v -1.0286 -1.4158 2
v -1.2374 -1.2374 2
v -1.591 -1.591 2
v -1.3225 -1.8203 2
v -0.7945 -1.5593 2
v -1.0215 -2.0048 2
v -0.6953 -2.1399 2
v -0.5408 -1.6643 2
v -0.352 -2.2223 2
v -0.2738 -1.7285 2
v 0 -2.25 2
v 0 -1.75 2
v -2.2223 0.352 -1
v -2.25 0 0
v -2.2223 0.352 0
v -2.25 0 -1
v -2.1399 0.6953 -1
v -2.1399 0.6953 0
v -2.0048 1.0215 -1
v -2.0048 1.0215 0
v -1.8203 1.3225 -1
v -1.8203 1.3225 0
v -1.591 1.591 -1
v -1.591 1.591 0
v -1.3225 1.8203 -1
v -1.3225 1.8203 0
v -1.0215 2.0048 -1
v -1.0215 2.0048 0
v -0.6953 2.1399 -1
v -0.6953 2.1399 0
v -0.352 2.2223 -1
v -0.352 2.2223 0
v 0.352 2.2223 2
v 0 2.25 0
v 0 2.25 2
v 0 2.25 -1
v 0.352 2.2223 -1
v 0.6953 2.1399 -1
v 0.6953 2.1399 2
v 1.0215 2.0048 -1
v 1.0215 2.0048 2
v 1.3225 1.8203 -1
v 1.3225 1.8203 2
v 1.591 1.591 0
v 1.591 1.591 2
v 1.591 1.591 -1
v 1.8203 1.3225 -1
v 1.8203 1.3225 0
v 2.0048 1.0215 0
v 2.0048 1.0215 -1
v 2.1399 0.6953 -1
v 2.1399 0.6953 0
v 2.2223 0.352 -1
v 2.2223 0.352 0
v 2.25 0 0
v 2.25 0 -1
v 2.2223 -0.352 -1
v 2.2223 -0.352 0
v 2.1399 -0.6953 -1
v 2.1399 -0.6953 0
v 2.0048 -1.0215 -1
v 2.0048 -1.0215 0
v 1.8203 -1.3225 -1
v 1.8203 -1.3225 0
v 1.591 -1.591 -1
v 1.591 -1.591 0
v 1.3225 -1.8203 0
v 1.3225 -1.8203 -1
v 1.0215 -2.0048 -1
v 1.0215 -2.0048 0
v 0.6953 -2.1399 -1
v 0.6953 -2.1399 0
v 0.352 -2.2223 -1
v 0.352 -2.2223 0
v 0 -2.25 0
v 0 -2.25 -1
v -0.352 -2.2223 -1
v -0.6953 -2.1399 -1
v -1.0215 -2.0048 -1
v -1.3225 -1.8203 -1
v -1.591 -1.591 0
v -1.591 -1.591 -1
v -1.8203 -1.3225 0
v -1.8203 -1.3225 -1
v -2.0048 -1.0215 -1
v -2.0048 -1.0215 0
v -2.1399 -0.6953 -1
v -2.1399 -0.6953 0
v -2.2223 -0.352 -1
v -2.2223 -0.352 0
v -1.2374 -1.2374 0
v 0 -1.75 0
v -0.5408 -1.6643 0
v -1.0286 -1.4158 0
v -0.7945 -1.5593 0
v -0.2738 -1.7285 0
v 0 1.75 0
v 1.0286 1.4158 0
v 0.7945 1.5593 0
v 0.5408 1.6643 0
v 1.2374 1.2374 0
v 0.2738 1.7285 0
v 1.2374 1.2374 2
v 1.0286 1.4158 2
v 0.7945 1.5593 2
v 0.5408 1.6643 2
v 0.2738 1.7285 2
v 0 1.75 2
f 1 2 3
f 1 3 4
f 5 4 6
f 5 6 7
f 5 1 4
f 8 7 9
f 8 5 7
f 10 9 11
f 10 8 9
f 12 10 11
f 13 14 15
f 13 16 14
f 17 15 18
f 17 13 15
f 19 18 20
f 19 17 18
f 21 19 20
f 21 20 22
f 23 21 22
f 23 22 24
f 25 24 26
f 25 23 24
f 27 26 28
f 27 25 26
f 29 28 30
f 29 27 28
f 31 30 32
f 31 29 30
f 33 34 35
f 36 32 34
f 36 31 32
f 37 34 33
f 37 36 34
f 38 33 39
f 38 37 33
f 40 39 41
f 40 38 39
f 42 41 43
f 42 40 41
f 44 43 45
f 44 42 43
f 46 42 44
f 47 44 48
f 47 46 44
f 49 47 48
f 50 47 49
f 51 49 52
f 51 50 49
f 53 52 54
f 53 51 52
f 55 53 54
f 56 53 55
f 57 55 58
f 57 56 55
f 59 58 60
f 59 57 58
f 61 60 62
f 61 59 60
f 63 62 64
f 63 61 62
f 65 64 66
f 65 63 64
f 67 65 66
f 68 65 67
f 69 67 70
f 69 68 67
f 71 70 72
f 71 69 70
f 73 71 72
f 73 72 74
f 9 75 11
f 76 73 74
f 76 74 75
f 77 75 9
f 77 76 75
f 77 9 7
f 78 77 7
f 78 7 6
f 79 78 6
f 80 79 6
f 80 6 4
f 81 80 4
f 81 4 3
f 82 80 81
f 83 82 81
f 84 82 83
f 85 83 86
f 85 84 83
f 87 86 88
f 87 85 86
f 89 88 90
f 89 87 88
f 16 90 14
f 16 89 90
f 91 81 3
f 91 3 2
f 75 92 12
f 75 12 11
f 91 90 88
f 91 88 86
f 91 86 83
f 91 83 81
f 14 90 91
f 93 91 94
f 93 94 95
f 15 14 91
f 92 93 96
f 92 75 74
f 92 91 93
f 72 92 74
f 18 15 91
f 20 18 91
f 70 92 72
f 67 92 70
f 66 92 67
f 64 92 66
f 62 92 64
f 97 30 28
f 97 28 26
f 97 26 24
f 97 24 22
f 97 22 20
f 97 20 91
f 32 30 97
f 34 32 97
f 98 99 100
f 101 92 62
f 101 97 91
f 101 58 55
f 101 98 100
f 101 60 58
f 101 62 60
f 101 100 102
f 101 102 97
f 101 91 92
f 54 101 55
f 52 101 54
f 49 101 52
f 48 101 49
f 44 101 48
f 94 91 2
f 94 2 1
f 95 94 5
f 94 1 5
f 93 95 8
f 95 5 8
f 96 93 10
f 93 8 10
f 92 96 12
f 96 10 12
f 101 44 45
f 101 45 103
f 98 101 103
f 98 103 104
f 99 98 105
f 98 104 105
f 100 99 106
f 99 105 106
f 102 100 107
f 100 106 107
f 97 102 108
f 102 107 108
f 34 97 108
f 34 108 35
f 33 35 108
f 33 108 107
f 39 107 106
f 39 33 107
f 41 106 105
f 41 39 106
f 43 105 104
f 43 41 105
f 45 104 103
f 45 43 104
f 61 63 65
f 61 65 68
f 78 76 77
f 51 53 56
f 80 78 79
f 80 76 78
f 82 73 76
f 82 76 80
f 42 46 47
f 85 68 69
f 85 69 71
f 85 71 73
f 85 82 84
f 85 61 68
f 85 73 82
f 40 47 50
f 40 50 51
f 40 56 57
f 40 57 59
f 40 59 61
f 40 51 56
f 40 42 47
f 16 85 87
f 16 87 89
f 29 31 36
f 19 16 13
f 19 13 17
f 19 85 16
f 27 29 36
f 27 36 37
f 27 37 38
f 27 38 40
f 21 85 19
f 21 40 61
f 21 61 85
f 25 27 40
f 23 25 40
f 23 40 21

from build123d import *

# Parameters (mm, degrees)
SKETCH9_R           = 2.25
BOSS_EXTRUDE1_DEPTH = 2
SHELL1_T            = -1
CUT_EXTRUDE4_START  = -1
CUT_EXTRUDE4_DEPTH  = 1
BOSS_EXTRUDE2_START = 1
SKETCH11_R          = 2.25
BOSS_EXTRUDE2_DEPTH = 1
CUT_EXTRUDE5_START  = -2
CUT_EXTRUDE5_DEPTH  = 2
SKETCH13_R          = 1.75
CUT_EXTRUDE6_DEPTH  = 2


with BuildPart() as part:
    # Sketch9 → Boss-Extrude1 (new body)
    with BuildSketch(Plane.XY):
        Circle(SKETCH9_R)
    extrude(amount=BOSS_EXTRUDE1_DEPTH)

    # Shell1
    shell1_openings = [part.faces().sort_by_distance(p)[0] for p in [
        (0, 0, 2),
    ]]
    offset(amount=SHELL1_T, openings=shell1_openings, kind=Kind.INTERSECTION)

    # Sketch10 → Cut-Extrude4 (cut)
    with BuildSketch(Plane.XY.offset(2).offset(CUT_EXTRUDE4_START)):
        with BuildLine():
            ThreePointArc((-0.883883476, -0.883883476), (-1.154849416, 0.47835429), (0, 1.25))
            Line((0, 1.25), (0, 2.25))
            ThreePointArc((0, 2.25), (-2.078728948, 0.861037723), (-1.590990258, -1.590990258))
            Line((-1.590990258, -1.590990258), (-0.883883476, -0.883883476))
        make_face()
        with BuildLine():
            Line((1.590990258, 1.590990258), (0.883883476, 0.883883476))
            ThreePointArc((0.883883476, 0.883883476), (1.154849416, 0.47835429), (1.25, 0))
            ThreePointArc((1.25, 0), (0.883883476, -0.883883476), (0, -1.25))
            Line((0, -1.25), (0, -2.25))
            ThreePointArc((0, -2.25), (1.590990258, -1.590990258), (2.25, 0))
            ThreePointArc((2.25, 0), (2.078728948, 0.861037723), (1.590990258, 1.590990258))
        make_face()
    extrude(amount=CUT_EXTRUDE4_DEPTH, mode=Mode.SUBTRACT)

    # Sketch11 → Boss-Extrude2 (add)
    with BuildSketch(Plane(origin=(0, 0, 0), x_dir=(-1, 0, 0), z_dir=(0, 0, -1)).offset(BOSS_EXTRUDE2_START)):
        Circle(SKETCH11_R)
    extrude(amount=-BOSS_EXTRUDE2_DEPTH)

    # Sketch12 → Cut-Extrude5 (cut)
    with BuildSketch(Plane.XY.offset(2).offset(CUT_EXTRUDE5_START)):
        with BuildLine():
            Line((0, 1.25), (0, 2.25))
            ThreePointArc((0, 2.25), (-2.078728948, 0.861037723), (-1.590990258, -1.590990258))
            Line((-1.590990258, -1.590990258), (-0.883883476, -0.883883476))
            ThreePointArc((-0.883883476, -0.883883476), (-0.47835429, -1.154849416), (0, -1.25))
            Line((0, -1.25), (0, -2.25))
            ThreePointArc((0, -2.25), (2.078728948, -0.861037723), (1.590990258, 1.590990258))
            Line((1.590990258, 1.590990258), (0.883883476, 0.883883476))
            ThreePointArc((0.883883476, 0.883883476), (0.47835429, 1.154849416), (0, 1.25))
        make_face()
    extrude(amount=CUT_EXTRUDE5_DEPTH, mode=Mode.SUBTRACT)

    # Sketch13 → Cut-Extrude6 (cut)
    with BuildSketch(Plane.XY.offset(2)):
        Circle(SKETCH13_R)
    extrude(amount=-CUT_EXTRUDE6_DEPTH, mode=Mode.SUBTRACT)


solid = part.part
